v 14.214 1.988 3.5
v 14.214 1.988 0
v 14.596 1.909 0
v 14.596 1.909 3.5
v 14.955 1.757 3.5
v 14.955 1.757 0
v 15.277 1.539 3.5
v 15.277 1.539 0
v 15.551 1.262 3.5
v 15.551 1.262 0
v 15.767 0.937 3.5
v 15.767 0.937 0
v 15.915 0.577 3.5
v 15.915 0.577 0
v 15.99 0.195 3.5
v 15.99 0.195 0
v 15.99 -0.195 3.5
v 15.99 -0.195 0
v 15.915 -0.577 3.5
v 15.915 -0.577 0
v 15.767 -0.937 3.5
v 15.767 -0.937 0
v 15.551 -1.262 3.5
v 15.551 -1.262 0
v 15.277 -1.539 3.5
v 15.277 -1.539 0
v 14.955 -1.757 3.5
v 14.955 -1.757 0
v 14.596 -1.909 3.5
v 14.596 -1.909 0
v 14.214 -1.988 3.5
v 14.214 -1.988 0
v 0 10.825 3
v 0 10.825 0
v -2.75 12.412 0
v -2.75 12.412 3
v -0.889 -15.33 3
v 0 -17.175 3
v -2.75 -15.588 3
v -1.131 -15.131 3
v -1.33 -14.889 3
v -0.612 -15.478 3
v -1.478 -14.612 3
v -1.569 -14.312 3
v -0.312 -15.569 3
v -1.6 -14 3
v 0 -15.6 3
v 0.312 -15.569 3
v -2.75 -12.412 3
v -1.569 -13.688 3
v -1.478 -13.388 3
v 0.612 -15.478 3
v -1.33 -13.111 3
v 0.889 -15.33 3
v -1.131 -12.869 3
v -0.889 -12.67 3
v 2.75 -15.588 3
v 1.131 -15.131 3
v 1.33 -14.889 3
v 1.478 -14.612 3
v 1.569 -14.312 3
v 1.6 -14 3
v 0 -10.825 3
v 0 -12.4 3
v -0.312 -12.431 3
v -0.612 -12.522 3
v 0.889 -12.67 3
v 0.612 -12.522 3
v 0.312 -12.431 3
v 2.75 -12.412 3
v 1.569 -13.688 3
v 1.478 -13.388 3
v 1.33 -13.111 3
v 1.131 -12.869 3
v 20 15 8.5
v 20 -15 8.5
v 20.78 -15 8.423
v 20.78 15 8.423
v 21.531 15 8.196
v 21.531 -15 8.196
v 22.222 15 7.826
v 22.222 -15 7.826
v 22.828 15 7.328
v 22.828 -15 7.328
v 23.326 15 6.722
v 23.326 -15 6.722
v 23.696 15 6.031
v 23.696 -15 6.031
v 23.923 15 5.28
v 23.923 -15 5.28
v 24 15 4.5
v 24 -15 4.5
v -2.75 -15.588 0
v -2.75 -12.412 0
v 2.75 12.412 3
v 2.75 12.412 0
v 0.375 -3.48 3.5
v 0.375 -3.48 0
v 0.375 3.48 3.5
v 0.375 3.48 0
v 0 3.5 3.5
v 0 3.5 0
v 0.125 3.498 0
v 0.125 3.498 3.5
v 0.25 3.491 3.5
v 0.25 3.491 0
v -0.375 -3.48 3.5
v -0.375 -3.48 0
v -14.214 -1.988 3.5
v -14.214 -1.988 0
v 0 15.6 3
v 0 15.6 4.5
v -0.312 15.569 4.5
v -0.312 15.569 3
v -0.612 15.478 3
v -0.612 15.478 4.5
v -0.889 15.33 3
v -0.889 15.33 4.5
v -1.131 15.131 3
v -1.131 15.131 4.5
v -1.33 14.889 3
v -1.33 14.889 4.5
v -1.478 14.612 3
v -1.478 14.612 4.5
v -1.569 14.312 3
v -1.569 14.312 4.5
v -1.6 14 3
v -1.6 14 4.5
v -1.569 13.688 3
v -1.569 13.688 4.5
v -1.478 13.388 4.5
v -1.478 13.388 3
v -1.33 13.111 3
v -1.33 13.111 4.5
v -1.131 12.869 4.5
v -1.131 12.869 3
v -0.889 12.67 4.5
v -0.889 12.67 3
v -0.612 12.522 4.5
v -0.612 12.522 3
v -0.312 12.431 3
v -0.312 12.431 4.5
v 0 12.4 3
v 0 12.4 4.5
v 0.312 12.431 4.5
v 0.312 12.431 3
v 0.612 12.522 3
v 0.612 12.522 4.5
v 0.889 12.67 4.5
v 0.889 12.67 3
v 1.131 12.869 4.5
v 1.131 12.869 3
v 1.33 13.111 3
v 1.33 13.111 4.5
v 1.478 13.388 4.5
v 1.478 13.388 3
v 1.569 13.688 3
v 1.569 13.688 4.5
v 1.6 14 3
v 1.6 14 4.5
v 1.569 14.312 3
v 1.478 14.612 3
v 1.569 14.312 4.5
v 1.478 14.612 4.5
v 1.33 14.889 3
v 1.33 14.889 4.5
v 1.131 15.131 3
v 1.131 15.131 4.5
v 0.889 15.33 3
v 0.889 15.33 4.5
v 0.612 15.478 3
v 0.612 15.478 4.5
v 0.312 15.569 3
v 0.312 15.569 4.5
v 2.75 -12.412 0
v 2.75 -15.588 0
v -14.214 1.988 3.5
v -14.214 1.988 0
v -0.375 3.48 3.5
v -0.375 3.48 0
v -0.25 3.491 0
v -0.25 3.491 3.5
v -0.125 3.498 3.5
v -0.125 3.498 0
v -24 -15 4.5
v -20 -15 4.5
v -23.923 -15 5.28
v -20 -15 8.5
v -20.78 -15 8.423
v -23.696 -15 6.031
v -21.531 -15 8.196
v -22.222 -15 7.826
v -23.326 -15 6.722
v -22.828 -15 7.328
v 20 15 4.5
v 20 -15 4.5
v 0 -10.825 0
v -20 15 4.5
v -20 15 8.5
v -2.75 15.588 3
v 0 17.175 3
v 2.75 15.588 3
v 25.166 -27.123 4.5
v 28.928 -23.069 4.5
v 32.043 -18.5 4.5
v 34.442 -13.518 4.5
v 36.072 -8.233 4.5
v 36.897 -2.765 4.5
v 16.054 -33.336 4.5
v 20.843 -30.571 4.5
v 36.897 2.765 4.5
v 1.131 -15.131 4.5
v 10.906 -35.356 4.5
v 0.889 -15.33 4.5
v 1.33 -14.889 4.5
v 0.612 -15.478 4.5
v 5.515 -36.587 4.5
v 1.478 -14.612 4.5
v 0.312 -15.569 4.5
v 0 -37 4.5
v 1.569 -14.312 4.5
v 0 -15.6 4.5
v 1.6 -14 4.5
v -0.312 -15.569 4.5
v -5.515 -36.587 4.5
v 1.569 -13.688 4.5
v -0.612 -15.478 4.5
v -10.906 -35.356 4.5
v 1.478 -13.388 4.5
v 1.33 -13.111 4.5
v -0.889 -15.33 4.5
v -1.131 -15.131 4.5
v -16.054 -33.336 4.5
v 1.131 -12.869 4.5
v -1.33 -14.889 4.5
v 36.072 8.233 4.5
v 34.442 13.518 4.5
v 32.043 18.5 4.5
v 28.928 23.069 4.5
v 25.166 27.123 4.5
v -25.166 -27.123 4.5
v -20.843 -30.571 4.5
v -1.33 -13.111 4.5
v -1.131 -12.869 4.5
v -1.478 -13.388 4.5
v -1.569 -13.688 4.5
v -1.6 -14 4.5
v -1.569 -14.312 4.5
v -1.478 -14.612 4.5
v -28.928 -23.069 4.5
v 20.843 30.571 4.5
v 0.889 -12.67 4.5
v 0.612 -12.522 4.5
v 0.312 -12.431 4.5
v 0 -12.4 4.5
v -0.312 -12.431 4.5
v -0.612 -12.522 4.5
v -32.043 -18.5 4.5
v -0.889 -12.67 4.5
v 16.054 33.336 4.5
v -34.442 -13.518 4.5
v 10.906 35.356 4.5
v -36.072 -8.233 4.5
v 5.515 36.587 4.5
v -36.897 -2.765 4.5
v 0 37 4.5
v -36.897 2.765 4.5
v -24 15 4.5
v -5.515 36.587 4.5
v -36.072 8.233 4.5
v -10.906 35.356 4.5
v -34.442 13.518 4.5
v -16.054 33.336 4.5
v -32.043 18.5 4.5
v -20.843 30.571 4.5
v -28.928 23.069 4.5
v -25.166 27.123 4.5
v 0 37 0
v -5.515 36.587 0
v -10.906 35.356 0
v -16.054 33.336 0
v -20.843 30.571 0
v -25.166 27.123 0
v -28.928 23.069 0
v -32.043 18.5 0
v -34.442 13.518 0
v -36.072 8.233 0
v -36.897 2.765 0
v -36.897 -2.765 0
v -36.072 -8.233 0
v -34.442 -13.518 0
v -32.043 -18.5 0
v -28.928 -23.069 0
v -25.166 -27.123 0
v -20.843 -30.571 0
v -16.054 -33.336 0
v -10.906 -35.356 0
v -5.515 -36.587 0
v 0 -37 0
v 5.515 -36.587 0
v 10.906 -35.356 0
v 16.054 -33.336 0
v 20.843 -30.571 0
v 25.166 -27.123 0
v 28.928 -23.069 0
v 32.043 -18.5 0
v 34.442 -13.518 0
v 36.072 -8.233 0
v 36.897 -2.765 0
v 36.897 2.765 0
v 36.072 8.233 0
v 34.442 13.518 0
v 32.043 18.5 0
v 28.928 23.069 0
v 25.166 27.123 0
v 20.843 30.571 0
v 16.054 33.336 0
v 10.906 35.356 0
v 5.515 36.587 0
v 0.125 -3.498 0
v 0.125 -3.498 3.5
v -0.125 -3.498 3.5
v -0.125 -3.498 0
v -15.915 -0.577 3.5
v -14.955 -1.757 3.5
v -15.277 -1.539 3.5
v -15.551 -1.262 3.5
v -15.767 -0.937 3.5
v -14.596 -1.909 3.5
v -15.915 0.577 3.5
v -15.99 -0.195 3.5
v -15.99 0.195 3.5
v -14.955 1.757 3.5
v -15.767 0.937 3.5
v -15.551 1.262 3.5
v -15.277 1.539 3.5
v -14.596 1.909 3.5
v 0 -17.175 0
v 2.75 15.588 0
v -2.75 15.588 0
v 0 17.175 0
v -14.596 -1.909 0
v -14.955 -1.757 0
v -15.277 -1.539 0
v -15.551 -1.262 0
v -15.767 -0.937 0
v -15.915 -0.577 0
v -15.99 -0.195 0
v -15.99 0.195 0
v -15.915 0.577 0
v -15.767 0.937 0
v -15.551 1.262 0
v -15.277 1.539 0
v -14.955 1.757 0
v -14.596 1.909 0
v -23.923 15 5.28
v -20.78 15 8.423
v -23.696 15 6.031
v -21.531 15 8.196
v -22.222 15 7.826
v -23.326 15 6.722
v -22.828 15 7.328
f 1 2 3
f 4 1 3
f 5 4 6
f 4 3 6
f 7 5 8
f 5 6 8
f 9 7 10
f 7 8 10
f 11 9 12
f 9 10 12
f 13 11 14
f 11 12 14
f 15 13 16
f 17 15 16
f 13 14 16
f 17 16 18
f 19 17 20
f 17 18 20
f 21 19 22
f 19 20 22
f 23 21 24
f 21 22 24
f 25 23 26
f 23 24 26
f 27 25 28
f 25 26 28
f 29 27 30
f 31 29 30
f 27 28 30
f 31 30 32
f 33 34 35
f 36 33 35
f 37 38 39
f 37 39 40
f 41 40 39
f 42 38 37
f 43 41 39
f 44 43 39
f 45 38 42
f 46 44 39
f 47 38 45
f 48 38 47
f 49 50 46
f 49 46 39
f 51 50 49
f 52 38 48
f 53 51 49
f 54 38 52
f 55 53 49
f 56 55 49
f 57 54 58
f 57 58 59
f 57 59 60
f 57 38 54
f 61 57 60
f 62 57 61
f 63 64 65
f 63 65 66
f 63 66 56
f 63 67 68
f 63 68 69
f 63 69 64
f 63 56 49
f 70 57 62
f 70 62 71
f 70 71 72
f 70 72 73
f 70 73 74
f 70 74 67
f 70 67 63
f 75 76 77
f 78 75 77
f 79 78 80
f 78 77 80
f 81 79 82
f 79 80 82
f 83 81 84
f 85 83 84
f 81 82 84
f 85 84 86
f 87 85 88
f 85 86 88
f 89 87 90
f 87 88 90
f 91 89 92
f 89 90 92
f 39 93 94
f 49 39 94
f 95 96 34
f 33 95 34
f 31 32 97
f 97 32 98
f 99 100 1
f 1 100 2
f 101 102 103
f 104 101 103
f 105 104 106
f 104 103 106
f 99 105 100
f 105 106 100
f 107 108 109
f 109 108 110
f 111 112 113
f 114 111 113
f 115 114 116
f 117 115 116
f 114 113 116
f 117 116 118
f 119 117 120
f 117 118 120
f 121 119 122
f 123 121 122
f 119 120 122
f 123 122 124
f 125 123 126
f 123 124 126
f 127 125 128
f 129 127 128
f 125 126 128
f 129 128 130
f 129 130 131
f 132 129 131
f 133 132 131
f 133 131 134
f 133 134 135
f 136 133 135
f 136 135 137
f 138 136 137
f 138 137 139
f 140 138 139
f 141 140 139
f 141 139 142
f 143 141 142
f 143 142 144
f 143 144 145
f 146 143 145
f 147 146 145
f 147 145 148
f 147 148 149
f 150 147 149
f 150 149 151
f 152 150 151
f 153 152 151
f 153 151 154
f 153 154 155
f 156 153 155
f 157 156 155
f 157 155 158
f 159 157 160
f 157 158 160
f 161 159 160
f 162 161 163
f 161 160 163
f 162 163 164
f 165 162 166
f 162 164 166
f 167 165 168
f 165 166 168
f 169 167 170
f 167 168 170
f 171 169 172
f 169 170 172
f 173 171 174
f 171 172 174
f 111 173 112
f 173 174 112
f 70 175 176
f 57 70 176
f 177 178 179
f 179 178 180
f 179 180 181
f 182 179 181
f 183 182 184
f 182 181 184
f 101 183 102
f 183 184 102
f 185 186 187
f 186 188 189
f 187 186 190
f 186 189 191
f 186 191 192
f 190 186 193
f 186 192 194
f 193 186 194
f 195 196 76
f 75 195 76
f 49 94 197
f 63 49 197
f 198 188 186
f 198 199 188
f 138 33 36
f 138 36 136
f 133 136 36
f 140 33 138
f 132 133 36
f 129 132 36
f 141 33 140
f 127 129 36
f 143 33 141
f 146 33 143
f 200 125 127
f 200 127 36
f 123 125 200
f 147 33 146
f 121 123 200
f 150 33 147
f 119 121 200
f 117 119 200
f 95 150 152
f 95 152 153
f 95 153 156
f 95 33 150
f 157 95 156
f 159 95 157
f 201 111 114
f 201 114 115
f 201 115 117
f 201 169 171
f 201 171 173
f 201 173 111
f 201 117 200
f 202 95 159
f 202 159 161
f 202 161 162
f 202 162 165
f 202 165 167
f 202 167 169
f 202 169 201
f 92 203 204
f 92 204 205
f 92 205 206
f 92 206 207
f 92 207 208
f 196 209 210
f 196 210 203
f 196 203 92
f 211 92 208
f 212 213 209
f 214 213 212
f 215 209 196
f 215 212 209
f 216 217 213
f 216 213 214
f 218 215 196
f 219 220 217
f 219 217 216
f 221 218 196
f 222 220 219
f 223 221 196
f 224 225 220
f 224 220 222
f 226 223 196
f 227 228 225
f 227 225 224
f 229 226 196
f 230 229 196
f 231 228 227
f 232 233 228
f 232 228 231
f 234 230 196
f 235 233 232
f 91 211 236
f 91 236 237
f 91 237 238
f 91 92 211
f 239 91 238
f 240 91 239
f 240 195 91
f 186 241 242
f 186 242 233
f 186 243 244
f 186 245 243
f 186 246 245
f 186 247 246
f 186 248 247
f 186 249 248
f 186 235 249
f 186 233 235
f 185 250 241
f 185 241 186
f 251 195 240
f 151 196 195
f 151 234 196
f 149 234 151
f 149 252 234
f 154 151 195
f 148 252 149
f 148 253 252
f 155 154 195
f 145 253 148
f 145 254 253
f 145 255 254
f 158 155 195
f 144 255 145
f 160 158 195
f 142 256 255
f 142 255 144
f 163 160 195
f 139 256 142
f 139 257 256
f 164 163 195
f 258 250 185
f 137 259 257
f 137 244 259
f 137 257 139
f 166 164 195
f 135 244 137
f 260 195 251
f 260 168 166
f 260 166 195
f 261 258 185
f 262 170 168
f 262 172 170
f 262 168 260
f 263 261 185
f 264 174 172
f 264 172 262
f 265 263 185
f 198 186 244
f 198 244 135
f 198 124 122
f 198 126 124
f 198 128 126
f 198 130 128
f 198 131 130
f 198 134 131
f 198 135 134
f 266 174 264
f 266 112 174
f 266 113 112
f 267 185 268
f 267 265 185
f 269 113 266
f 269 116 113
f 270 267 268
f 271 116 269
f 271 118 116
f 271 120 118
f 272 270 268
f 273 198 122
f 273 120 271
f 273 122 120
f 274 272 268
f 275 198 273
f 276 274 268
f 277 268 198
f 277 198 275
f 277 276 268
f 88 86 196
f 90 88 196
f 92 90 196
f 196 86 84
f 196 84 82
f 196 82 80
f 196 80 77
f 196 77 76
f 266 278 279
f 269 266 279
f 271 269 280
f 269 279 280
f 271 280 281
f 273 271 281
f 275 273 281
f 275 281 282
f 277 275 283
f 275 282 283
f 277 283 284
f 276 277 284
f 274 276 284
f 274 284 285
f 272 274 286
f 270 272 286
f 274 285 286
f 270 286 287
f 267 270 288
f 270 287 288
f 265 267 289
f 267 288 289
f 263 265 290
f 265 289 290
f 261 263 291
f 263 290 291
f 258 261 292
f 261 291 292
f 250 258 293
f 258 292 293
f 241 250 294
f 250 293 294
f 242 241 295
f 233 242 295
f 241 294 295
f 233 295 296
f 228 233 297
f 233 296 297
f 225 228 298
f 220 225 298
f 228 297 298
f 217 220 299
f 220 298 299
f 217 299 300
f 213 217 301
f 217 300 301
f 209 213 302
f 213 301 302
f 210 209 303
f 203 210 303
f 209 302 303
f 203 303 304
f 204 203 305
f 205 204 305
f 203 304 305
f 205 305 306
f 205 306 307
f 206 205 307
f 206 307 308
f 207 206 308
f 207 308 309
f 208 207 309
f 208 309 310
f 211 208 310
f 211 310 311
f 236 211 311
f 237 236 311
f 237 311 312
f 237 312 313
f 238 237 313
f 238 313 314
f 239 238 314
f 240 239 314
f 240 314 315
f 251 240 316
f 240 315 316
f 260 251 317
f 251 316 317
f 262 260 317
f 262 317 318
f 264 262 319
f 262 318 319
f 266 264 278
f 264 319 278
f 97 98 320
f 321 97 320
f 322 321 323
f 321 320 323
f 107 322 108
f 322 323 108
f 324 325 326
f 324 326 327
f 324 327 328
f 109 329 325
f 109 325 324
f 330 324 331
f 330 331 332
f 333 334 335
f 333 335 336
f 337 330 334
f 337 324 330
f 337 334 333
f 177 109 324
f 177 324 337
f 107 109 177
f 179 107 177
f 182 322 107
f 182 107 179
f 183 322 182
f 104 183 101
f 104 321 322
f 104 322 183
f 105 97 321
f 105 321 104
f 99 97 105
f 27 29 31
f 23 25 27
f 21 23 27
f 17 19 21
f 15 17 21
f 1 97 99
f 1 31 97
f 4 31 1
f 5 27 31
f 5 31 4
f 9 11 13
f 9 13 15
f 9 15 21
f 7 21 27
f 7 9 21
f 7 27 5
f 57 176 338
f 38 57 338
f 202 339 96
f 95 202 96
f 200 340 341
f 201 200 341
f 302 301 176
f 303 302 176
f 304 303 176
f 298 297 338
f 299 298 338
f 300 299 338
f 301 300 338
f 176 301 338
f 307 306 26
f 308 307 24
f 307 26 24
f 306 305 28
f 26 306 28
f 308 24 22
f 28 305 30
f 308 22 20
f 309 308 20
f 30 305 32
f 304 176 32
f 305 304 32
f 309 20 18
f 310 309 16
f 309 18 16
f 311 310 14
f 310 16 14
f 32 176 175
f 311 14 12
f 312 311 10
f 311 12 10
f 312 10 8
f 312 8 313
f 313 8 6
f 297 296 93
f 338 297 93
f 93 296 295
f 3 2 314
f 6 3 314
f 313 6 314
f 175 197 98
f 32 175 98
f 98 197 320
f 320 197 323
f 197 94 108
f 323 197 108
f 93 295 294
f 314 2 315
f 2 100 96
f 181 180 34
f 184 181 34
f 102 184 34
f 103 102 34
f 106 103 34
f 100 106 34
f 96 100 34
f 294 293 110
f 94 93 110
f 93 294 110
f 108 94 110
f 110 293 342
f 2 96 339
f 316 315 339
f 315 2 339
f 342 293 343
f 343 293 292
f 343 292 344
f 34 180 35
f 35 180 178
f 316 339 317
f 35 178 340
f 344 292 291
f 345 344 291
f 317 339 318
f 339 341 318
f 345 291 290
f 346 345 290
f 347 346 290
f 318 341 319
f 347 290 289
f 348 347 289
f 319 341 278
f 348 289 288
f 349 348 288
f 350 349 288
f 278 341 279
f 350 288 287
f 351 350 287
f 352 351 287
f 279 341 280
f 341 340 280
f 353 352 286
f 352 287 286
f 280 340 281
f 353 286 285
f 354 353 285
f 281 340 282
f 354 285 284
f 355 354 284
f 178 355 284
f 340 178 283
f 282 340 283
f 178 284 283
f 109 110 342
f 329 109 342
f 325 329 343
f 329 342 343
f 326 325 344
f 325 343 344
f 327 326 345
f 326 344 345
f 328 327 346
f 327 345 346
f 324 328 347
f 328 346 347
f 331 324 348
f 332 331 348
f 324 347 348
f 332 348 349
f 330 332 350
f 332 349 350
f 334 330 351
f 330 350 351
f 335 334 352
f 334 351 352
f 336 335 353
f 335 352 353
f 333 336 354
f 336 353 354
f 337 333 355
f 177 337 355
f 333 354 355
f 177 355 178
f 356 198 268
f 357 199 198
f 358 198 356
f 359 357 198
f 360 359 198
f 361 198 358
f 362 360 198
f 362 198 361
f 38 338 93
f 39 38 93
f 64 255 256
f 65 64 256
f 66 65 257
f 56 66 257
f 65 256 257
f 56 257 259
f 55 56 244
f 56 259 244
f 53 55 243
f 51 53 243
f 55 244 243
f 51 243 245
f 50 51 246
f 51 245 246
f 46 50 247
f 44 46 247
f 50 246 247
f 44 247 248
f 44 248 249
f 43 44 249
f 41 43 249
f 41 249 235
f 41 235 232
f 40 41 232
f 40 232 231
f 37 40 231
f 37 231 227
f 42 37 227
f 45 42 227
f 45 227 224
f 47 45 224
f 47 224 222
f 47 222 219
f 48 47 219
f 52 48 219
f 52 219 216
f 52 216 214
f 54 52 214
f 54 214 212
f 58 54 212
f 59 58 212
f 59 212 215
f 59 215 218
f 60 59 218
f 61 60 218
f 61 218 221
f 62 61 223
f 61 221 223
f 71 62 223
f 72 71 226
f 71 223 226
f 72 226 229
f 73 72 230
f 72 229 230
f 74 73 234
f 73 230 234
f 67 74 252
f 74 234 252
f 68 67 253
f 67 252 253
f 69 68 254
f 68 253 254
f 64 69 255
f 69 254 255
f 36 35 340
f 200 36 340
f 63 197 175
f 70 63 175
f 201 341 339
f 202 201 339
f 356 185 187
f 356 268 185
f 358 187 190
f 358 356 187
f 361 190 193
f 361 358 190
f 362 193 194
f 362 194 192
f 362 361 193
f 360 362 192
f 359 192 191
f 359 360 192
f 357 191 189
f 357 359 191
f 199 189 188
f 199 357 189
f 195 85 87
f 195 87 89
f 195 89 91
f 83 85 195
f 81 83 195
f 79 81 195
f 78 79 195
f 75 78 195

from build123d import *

# Parameters (mm, degrees)
F0_R      = 37
F1_DEPTH  = 4.5
F3_DEPTH  = 3.5
F5_DEPTH  = 15
F6_R      = 1.6
F7_DEPTH  = 4.501
F9_DEPTH  = 3
F11_ANGLE = 90


with BuildPart() as f1:
    # F0 (on Top) → F1 (new body)
    with BuildSketch(Plane.XY):
        Circle(F0_R)
    extrude(amount=F1_DEPTH)

    # F2 (on face) → F3 (cut)
    with BuildSketch(Plane(origin=(0, 0, 0), x_dir=(1, 0, 0), z_dir=(0, 0, -1))):
        with BuildLine():
            ThreePointArc((3.4798527268, -0.375), (3.4949595522, -0.1877704134), (3.5, 0))
            ThreePointArc((3.5, 0), (3.4949595522, 0.1877704134), (3.4798527268, 0.375))
            ThreePointArc((3.4798527268, 0.375), (2.3385358667, 2.604083332), (0, 3.5))
            ThreePointArc((0, 3.5), (-2.3385358667, 2.604083332), (-3.4798527268, 0.375))
            ThreePointArc((-3.4798527268, 0.375), (-3.5, 0), (-3.4798527268, -0.375))
            ThreePointArc((-3.4798527268, -0.375), (0, -3.5), (3.4798527268, -0.375))
        make_face()
        with BuildLine():
            ThreePointArc((0, 3.5), (2.3385358667, 2.604083332), (3.4798527268, 0.375))
            Line((3.4798527268, 0.375), (1.9884872724, 14.2142857143))
            ThreePointArc((1.9884872724, 14.2142857143), (1.9971197441, 14.1072973791), (2, 14))
            ThreePointArc((2, 14), (1.4142135624, 12.5857864376), (0, 12))
            Line((0, 12), (0, 3.5))
        make_face()
        with BuildLine():
            Line((1.9884872724, -14.2142857143), (3.4798527268, -0.375))
            ThreePointArc((3.4798527268, -0.375), (0, -3.5), (-3.4798527268, -0.375))
            Line((-3.4798527268, -0.375), (-1.9884872724, -14.2142857143))
            ThreePointArc((-1.9884872724, -14.2142857143), (-0.1072973791, -12.0028802559), (2, -14))
            ThreePointArc((2, -14), (1.9971197441, -14.1072973791), (1.9884872724, -14.2142857143))
        make_face()
        with BuildLine():
            ThreePointArc((-3.4798527268, 0.375), (-2.3385358667, 2.604083332), (0, 3.5))
            Line((0, 3.5), (0, 12))
            ThreePointArc((0, 12), (-1.4880476183, 12.6636937904), (-1.9884872724, 14.2142857143))
            Line((-1.9884872724, 14.2142857143), (-3.4798527268, 0.375))
        make_face()
        with BuildLine():
            ThreePointArc((2, 14), (1.9971197441, 14.1072973791), (1.9884872724, 14.2142857143))
            ThreePointArc((1.9884872724, 14.2142857143), (0, 16), (-1.9884872724, 14.2142857143))
            ThreePointArc((-1.9884872724, 14.2142857143), (-1.4880476183, 12.6636937904), (0, 12))
            ThreePointArc((0, 12), (1.4142135624, 12.5857864376), (2, 14))
        make_face()
        with BuildLine():
            ThreePointArc((-1.9884872724, -14.2142857143), (0, -16), (1.9884872724, -14.2142857143))
            ThreePointArc((1.9884872724, -14.2142857143), (1.9971197441, -14.1072973791), (2, -14))
            ThreePointArc((2, -14), (-0.1072973791, -12.0028802559), (-1.9884872724, -14.2142857143))
        make_face()
    extrude(amount=-F3_DEPTH, mode=Mode.SUBTRACT)

    # F4 (on Right) → F5 (join, symmetric)
    with BuildSketch(Plane.YZ):
        with BuildLine():
            ThreePointArc((-20, 8.5), (-22.8284271247, 7.3284271247), (-24, 4.5))
            Line((-24, 4.5), (-20, 4.5))
            Line((-20, 4.5), (-20, 8.5))
        make_face()
        with BuildLine():
            Line((20, 8.5), (20, 4.5))
            Line((20, 4.5), (24, 4.5))
            ThreePointArc((24, 4.5), (22.8284271247, 7.3284271247), (20, 8.5))
        make_face()
    extrude(amount=F5_DEPTH, both=True)

    # F6 (on face) → F7 (cut, through all)
    with BuildSketch(Plane.XY.offset(4.5)):
        with Locations((-14, 0)):
            Circle(F6_R)
        with Locations((14, 0)):
            Circle(F6_R)
    extrude(amount=-F7_DEPTH, mode=Mode.SUBTRACT)

    # F8 (on face) → F9 (cut)
    with BuildSketch(Plane(origin=(0, 0, 0), x_dir=(1, 0, 0), z_dir=(0, 0, -1))):
        Polygon((12.4122867597, 2.75), (10.8245735195, 0), (12.4122867597, -2.75), (15.5877132403, -2.75), (17.1754264805, 0), (15.5877132403, 2.75), align=None)
        Polygon((-12.4122867597, -2.75), (-10.8245735195, 0), (-12.4122867597, 2.75), (-15.5877132403, 2.75), (-17.1754264805, 0), (-15.5877132403, -2.75), align=None)
    extrude(amount=-F9_DEPTH, mode=Mode.SUBTRACT)


with BuildPart() as f1_1:
    # F11: moved
    add(f1.part.rotate(Axis((0, 0, 35.3244128637), (0, 0, 1)), F11_ANGLE))


solid = f1_1.part
